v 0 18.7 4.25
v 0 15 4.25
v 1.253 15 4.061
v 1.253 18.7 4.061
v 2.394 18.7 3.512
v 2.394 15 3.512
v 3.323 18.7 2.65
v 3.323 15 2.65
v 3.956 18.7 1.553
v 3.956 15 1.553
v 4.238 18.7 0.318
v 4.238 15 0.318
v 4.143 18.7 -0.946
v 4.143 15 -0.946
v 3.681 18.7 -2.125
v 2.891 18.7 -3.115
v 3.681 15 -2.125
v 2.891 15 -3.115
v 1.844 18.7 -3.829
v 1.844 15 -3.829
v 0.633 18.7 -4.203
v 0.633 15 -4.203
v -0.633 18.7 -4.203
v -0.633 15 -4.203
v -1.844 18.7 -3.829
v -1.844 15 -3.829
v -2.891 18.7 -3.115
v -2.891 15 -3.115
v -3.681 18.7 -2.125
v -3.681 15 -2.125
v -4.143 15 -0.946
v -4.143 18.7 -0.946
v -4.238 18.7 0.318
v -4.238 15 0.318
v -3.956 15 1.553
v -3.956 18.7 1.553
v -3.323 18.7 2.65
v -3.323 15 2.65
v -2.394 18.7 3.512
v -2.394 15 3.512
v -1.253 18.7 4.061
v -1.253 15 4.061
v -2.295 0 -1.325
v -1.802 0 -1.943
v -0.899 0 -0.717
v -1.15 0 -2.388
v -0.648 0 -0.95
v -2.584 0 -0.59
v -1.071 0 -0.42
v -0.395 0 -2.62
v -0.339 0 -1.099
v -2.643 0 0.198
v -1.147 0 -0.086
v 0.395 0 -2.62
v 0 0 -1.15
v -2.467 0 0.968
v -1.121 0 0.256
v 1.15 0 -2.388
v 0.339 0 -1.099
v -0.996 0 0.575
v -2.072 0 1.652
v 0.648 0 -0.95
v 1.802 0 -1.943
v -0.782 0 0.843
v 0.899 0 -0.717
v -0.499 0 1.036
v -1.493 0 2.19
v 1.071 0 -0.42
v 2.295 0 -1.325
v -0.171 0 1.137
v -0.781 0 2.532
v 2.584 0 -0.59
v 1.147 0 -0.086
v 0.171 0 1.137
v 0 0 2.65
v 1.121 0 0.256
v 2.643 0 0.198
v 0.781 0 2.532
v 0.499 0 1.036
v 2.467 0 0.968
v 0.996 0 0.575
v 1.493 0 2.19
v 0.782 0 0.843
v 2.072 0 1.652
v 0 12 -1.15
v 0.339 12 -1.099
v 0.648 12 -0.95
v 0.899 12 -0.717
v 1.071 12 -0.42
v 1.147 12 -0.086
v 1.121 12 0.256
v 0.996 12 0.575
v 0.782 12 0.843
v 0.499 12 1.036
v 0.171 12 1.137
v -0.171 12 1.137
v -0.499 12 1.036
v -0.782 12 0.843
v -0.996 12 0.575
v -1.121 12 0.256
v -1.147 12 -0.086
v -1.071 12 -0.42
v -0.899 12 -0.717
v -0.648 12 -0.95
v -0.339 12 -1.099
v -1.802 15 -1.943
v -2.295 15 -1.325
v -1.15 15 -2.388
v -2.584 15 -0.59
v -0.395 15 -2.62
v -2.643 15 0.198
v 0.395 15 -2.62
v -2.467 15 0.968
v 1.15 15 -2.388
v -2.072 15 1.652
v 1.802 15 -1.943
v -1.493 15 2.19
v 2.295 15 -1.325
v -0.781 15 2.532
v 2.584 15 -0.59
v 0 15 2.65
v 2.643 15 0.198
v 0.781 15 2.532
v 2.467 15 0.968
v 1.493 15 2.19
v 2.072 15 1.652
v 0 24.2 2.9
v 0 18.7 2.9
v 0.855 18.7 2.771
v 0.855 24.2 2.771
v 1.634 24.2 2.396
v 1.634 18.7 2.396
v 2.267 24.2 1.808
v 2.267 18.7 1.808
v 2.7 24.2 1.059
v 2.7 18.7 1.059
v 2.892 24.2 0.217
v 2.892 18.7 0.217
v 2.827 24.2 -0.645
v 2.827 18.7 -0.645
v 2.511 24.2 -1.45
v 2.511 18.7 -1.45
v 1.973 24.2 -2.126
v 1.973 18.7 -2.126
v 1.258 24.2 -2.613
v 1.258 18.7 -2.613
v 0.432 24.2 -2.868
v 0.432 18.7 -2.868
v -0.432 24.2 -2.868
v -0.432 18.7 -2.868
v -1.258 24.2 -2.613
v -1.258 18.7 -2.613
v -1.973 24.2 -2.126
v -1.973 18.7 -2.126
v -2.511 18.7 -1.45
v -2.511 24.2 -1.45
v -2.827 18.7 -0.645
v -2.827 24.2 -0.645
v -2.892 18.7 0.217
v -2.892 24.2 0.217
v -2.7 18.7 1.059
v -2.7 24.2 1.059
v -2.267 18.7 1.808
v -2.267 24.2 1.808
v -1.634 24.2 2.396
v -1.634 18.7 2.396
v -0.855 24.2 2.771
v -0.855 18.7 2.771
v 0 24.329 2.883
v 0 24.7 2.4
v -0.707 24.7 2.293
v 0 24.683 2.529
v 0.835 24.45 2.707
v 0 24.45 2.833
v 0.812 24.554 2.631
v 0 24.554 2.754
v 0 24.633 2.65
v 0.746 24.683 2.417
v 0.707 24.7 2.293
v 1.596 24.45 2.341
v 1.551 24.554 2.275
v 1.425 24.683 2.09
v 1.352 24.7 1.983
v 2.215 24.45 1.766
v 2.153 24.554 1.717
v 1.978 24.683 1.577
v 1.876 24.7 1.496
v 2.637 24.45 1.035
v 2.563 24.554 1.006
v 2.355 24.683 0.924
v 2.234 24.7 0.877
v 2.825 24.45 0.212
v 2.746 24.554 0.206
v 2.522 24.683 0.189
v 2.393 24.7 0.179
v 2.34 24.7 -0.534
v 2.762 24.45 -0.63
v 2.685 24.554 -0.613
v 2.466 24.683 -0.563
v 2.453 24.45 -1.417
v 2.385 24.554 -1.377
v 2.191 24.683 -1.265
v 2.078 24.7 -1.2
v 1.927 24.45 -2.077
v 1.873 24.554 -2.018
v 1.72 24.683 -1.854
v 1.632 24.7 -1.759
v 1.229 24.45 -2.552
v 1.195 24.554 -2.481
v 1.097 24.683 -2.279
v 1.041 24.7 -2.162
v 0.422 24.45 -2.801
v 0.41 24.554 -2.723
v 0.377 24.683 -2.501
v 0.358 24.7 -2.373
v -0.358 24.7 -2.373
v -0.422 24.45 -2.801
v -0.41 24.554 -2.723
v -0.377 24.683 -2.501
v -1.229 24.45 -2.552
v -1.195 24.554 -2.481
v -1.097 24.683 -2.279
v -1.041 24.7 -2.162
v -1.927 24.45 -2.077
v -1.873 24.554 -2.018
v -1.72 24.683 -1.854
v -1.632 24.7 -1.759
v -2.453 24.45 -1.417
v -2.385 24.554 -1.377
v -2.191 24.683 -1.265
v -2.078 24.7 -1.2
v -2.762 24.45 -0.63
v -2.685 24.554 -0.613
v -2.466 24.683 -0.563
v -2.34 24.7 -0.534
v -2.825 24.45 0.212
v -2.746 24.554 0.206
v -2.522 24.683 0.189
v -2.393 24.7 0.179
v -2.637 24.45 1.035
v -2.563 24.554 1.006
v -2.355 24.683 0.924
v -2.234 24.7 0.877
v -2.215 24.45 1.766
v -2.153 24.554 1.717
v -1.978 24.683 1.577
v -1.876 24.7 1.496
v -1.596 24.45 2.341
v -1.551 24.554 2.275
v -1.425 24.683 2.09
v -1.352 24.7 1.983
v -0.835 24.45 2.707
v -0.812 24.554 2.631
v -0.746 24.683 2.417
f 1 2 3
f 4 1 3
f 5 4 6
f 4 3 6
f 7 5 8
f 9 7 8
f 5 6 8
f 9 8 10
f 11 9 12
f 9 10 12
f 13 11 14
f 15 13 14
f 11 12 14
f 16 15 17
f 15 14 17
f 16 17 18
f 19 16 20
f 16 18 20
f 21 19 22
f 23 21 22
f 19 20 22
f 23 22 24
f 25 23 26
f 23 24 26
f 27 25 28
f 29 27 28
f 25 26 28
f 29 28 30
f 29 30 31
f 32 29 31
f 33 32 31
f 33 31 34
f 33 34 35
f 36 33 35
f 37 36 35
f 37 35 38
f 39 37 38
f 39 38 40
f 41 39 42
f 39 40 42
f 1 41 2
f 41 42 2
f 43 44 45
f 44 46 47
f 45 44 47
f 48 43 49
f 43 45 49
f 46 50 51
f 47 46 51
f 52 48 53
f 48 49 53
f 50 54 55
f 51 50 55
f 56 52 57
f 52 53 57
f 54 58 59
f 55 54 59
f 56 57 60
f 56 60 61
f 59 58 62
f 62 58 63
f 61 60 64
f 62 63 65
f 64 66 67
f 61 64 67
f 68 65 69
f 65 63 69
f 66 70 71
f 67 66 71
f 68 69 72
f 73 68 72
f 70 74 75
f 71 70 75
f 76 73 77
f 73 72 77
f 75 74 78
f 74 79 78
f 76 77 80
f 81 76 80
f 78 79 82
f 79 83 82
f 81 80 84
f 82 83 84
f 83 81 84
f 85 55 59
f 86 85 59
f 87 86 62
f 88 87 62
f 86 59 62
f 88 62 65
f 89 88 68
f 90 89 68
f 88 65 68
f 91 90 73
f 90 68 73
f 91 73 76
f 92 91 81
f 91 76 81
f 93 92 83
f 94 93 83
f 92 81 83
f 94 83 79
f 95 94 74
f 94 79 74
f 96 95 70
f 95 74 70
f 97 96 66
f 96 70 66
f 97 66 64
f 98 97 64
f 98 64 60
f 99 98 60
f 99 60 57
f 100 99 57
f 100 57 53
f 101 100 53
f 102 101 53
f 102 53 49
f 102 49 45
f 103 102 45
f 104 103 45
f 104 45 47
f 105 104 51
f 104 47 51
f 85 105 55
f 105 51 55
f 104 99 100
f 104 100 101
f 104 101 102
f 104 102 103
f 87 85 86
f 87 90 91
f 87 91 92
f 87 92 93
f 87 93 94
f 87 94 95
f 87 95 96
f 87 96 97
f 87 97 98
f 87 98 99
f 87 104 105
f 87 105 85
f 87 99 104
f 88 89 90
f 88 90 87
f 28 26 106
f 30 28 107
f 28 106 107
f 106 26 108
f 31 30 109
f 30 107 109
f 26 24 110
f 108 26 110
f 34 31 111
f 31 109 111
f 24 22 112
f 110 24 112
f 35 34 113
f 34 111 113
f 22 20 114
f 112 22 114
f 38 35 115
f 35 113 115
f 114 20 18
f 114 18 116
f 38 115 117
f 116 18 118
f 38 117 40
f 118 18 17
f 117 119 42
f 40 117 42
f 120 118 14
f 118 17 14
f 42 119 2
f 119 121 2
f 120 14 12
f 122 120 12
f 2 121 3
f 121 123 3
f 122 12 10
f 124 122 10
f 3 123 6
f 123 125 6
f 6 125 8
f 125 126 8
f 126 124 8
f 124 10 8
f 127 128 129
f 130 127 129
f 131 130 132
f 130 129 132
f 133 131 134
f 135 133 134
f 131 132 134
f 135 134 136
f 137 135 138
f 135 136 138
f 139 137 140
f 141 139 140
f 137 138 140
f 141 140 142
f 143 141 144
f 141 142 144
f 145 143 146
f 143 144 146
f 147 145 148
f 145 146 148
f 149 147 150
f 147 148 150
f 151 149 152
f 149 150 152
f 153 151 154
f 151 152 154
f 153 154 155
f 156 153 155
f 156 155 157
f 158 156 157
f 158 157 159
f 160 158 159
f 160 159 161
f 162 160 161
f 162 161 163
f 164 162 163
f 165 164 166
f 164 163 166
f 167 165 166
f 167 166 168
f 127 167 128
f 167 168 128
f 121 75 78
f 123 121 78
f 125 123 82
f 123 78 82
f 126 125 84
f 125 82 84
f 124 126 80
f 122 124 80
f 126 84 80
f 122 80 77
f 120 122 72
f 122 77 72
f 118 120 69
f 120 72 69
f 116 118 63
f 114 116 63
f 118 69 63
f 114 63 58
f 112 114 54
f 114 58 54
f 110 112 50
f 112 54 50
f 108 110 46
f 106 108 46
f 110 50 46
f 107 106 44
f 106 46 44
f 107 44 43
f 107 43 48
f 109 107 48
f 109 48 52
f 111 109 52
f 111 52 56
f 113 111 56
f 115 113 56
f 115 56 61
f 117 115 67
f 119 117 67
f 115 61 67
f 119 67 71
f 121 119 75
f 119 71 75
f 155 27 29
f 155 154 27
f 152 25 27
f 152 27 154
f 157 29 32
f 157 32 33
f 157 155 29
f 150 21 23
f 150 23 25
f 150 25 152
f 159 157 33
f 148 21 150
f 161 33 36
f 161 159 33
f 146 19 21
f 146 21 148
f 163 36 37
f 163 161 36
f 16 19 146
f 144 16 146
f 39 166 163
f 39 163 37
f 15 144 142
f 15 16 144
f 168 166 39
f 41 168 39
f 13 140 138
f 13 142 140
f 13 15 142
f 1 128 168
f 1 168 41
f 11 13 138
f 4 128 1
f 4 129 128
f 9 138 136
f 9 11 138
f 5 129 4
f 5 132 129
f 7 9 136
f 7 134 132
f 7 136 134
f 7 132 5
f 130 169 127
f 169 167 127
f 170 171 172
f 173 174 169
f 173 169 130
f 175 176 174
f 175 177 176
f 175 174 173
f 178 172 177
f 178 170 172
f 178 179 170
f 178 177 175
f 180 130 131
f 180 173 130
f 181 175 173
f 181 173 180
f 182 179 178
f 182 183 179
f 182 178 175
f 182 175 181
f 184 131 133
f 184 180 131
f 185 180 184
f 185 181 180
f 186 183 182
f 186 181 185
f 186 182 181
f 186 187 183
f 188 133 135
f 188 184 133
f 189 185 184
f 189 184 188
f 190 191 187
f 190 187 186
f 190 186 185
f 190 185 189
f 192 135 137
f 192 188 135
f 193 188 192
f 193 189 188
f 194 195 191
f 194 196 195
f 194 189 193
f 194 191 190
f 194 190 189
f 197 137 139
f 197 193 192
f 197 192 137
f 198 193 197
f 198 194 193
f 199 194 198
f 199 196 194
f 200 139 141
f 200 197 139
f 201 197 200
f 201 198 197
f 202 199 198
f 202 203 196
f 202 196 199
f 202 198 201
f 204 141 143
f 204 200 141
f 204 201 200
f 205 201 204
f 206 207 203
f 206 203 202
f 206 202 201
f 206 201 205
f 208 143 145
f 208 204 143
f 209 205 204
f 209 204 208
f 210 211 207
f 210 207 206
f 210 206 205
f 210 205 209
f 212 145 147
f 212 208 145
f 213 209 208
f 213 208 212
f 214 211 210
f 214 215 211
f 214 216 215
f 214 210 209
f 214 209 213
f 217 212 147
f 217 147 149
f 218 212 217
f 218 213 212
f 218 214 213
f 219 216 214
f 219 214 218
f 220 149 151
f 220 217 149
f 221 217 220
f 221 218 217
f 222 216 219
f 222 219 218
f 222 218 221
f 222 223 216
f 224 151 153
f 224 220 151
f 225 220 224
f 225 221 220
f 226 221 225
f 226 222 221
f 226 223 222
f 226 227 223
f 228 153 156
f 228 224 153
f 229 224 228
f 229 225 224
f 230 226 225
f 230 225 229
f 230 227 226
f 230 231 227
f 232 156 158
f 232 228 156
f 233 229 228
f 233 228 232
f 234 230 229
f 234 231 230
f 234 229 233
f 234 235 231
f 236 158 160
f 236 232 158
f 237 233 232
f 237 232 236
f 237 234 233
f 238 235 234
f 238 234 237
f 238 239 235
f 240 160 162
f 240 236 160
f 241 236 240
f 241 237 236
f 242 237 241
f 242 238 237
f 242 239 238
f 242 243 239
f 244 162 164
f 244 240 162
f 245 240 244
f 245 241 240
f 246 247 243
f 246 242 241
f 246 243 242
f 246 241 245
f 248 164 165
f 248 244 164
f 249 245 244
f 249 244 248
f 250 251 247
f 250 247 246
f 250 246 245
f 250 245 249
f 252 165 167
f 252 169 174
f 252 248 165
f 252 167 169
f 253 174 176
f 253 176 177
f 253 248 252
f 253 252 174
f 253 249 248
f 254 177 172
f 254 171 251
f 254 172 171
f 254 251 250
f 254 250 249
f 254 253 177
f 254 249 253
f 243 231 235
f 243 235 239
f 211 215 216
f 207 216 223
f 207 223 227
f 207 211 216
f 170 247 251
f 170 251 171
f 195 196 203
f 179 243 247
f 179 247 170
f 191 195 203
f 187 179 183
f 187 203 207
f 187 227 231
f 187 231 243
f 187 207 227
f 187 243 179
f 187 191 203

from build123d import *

# Parameters (mm, degrees)
SKETCH1_R           = 2.65
BOSS_EXTRUDE1_DEPTH = 15
SKETCH2_R           = 1.15
CUT_EXTRUDE1_DEPTH  = 12
SKETCH3_R           = 4.25
BOSS_EXTRUDE2_DEPTH = 3.7
SKETCH4_R           = 2.9
BOSS_EXTRUDE3_DEPTH = 6
FILLET2_R           = 0.5


with BuildPart() as part:
    # Sketch1 → Boss-Extrude1 (new body)
    with BuildSketch(Plane(origin=(0, 0, 0), x_dir=(1, 0, 0), z_dir=(0, 1, 0))):
        with Locations(Location((0, 0, 0), (0, 0, 270))):
            Circle(SKETCH1_R)
    extrude(amount=BOSS_EXTRUDE1_DEPTH)

    # Sketch2 → Cut-Extrude1 (cut)
    with BuildSketch(Plane.XZ):
        with Locations(Location((0, 0, 0), (0, 0, 270))):
            Circle(SKETCH2_R)
    extrude(amount=-CUT_EXTRUDE1_DEPTH, mode=Mode.SUBTRACT)

    # Sketch3 → Boss-Extrude2 (add)
    with BuildSketch(Plane(origin=(0, 15, 0), x_dir=(1, 0, 0), z_dir=(0, 1, 0))):
        with Locations(Location((0, 0, 0), (0, 0, 270))):
            Circle(SKETCH3_R)
    extrude(amount=BOSS_EXTRUDE2_DEPTH)

    # Sketch4 → Boss-Extrude3 (add)
    with BuildSketch(Plane(origin=(0, 18.7, 0), x_dir=(1, 0, 0), z_dir=(0, 1, 0))):
        with Locations(Location((0, 0, 0), (0, 0, 270))):
            Circle(SKETCH4_R)
    extrude(amount=BOSS_EXTRUDE3_DEPTH)

    # Fillet2
    fillet2_edges = [part.edges().sort_by_distance(p)[0] for p in [
        (0, 24.7, -2.9),
    ]]
    fillet(fillet2_edges, radius=FILLET2_R)


solid = part.part
